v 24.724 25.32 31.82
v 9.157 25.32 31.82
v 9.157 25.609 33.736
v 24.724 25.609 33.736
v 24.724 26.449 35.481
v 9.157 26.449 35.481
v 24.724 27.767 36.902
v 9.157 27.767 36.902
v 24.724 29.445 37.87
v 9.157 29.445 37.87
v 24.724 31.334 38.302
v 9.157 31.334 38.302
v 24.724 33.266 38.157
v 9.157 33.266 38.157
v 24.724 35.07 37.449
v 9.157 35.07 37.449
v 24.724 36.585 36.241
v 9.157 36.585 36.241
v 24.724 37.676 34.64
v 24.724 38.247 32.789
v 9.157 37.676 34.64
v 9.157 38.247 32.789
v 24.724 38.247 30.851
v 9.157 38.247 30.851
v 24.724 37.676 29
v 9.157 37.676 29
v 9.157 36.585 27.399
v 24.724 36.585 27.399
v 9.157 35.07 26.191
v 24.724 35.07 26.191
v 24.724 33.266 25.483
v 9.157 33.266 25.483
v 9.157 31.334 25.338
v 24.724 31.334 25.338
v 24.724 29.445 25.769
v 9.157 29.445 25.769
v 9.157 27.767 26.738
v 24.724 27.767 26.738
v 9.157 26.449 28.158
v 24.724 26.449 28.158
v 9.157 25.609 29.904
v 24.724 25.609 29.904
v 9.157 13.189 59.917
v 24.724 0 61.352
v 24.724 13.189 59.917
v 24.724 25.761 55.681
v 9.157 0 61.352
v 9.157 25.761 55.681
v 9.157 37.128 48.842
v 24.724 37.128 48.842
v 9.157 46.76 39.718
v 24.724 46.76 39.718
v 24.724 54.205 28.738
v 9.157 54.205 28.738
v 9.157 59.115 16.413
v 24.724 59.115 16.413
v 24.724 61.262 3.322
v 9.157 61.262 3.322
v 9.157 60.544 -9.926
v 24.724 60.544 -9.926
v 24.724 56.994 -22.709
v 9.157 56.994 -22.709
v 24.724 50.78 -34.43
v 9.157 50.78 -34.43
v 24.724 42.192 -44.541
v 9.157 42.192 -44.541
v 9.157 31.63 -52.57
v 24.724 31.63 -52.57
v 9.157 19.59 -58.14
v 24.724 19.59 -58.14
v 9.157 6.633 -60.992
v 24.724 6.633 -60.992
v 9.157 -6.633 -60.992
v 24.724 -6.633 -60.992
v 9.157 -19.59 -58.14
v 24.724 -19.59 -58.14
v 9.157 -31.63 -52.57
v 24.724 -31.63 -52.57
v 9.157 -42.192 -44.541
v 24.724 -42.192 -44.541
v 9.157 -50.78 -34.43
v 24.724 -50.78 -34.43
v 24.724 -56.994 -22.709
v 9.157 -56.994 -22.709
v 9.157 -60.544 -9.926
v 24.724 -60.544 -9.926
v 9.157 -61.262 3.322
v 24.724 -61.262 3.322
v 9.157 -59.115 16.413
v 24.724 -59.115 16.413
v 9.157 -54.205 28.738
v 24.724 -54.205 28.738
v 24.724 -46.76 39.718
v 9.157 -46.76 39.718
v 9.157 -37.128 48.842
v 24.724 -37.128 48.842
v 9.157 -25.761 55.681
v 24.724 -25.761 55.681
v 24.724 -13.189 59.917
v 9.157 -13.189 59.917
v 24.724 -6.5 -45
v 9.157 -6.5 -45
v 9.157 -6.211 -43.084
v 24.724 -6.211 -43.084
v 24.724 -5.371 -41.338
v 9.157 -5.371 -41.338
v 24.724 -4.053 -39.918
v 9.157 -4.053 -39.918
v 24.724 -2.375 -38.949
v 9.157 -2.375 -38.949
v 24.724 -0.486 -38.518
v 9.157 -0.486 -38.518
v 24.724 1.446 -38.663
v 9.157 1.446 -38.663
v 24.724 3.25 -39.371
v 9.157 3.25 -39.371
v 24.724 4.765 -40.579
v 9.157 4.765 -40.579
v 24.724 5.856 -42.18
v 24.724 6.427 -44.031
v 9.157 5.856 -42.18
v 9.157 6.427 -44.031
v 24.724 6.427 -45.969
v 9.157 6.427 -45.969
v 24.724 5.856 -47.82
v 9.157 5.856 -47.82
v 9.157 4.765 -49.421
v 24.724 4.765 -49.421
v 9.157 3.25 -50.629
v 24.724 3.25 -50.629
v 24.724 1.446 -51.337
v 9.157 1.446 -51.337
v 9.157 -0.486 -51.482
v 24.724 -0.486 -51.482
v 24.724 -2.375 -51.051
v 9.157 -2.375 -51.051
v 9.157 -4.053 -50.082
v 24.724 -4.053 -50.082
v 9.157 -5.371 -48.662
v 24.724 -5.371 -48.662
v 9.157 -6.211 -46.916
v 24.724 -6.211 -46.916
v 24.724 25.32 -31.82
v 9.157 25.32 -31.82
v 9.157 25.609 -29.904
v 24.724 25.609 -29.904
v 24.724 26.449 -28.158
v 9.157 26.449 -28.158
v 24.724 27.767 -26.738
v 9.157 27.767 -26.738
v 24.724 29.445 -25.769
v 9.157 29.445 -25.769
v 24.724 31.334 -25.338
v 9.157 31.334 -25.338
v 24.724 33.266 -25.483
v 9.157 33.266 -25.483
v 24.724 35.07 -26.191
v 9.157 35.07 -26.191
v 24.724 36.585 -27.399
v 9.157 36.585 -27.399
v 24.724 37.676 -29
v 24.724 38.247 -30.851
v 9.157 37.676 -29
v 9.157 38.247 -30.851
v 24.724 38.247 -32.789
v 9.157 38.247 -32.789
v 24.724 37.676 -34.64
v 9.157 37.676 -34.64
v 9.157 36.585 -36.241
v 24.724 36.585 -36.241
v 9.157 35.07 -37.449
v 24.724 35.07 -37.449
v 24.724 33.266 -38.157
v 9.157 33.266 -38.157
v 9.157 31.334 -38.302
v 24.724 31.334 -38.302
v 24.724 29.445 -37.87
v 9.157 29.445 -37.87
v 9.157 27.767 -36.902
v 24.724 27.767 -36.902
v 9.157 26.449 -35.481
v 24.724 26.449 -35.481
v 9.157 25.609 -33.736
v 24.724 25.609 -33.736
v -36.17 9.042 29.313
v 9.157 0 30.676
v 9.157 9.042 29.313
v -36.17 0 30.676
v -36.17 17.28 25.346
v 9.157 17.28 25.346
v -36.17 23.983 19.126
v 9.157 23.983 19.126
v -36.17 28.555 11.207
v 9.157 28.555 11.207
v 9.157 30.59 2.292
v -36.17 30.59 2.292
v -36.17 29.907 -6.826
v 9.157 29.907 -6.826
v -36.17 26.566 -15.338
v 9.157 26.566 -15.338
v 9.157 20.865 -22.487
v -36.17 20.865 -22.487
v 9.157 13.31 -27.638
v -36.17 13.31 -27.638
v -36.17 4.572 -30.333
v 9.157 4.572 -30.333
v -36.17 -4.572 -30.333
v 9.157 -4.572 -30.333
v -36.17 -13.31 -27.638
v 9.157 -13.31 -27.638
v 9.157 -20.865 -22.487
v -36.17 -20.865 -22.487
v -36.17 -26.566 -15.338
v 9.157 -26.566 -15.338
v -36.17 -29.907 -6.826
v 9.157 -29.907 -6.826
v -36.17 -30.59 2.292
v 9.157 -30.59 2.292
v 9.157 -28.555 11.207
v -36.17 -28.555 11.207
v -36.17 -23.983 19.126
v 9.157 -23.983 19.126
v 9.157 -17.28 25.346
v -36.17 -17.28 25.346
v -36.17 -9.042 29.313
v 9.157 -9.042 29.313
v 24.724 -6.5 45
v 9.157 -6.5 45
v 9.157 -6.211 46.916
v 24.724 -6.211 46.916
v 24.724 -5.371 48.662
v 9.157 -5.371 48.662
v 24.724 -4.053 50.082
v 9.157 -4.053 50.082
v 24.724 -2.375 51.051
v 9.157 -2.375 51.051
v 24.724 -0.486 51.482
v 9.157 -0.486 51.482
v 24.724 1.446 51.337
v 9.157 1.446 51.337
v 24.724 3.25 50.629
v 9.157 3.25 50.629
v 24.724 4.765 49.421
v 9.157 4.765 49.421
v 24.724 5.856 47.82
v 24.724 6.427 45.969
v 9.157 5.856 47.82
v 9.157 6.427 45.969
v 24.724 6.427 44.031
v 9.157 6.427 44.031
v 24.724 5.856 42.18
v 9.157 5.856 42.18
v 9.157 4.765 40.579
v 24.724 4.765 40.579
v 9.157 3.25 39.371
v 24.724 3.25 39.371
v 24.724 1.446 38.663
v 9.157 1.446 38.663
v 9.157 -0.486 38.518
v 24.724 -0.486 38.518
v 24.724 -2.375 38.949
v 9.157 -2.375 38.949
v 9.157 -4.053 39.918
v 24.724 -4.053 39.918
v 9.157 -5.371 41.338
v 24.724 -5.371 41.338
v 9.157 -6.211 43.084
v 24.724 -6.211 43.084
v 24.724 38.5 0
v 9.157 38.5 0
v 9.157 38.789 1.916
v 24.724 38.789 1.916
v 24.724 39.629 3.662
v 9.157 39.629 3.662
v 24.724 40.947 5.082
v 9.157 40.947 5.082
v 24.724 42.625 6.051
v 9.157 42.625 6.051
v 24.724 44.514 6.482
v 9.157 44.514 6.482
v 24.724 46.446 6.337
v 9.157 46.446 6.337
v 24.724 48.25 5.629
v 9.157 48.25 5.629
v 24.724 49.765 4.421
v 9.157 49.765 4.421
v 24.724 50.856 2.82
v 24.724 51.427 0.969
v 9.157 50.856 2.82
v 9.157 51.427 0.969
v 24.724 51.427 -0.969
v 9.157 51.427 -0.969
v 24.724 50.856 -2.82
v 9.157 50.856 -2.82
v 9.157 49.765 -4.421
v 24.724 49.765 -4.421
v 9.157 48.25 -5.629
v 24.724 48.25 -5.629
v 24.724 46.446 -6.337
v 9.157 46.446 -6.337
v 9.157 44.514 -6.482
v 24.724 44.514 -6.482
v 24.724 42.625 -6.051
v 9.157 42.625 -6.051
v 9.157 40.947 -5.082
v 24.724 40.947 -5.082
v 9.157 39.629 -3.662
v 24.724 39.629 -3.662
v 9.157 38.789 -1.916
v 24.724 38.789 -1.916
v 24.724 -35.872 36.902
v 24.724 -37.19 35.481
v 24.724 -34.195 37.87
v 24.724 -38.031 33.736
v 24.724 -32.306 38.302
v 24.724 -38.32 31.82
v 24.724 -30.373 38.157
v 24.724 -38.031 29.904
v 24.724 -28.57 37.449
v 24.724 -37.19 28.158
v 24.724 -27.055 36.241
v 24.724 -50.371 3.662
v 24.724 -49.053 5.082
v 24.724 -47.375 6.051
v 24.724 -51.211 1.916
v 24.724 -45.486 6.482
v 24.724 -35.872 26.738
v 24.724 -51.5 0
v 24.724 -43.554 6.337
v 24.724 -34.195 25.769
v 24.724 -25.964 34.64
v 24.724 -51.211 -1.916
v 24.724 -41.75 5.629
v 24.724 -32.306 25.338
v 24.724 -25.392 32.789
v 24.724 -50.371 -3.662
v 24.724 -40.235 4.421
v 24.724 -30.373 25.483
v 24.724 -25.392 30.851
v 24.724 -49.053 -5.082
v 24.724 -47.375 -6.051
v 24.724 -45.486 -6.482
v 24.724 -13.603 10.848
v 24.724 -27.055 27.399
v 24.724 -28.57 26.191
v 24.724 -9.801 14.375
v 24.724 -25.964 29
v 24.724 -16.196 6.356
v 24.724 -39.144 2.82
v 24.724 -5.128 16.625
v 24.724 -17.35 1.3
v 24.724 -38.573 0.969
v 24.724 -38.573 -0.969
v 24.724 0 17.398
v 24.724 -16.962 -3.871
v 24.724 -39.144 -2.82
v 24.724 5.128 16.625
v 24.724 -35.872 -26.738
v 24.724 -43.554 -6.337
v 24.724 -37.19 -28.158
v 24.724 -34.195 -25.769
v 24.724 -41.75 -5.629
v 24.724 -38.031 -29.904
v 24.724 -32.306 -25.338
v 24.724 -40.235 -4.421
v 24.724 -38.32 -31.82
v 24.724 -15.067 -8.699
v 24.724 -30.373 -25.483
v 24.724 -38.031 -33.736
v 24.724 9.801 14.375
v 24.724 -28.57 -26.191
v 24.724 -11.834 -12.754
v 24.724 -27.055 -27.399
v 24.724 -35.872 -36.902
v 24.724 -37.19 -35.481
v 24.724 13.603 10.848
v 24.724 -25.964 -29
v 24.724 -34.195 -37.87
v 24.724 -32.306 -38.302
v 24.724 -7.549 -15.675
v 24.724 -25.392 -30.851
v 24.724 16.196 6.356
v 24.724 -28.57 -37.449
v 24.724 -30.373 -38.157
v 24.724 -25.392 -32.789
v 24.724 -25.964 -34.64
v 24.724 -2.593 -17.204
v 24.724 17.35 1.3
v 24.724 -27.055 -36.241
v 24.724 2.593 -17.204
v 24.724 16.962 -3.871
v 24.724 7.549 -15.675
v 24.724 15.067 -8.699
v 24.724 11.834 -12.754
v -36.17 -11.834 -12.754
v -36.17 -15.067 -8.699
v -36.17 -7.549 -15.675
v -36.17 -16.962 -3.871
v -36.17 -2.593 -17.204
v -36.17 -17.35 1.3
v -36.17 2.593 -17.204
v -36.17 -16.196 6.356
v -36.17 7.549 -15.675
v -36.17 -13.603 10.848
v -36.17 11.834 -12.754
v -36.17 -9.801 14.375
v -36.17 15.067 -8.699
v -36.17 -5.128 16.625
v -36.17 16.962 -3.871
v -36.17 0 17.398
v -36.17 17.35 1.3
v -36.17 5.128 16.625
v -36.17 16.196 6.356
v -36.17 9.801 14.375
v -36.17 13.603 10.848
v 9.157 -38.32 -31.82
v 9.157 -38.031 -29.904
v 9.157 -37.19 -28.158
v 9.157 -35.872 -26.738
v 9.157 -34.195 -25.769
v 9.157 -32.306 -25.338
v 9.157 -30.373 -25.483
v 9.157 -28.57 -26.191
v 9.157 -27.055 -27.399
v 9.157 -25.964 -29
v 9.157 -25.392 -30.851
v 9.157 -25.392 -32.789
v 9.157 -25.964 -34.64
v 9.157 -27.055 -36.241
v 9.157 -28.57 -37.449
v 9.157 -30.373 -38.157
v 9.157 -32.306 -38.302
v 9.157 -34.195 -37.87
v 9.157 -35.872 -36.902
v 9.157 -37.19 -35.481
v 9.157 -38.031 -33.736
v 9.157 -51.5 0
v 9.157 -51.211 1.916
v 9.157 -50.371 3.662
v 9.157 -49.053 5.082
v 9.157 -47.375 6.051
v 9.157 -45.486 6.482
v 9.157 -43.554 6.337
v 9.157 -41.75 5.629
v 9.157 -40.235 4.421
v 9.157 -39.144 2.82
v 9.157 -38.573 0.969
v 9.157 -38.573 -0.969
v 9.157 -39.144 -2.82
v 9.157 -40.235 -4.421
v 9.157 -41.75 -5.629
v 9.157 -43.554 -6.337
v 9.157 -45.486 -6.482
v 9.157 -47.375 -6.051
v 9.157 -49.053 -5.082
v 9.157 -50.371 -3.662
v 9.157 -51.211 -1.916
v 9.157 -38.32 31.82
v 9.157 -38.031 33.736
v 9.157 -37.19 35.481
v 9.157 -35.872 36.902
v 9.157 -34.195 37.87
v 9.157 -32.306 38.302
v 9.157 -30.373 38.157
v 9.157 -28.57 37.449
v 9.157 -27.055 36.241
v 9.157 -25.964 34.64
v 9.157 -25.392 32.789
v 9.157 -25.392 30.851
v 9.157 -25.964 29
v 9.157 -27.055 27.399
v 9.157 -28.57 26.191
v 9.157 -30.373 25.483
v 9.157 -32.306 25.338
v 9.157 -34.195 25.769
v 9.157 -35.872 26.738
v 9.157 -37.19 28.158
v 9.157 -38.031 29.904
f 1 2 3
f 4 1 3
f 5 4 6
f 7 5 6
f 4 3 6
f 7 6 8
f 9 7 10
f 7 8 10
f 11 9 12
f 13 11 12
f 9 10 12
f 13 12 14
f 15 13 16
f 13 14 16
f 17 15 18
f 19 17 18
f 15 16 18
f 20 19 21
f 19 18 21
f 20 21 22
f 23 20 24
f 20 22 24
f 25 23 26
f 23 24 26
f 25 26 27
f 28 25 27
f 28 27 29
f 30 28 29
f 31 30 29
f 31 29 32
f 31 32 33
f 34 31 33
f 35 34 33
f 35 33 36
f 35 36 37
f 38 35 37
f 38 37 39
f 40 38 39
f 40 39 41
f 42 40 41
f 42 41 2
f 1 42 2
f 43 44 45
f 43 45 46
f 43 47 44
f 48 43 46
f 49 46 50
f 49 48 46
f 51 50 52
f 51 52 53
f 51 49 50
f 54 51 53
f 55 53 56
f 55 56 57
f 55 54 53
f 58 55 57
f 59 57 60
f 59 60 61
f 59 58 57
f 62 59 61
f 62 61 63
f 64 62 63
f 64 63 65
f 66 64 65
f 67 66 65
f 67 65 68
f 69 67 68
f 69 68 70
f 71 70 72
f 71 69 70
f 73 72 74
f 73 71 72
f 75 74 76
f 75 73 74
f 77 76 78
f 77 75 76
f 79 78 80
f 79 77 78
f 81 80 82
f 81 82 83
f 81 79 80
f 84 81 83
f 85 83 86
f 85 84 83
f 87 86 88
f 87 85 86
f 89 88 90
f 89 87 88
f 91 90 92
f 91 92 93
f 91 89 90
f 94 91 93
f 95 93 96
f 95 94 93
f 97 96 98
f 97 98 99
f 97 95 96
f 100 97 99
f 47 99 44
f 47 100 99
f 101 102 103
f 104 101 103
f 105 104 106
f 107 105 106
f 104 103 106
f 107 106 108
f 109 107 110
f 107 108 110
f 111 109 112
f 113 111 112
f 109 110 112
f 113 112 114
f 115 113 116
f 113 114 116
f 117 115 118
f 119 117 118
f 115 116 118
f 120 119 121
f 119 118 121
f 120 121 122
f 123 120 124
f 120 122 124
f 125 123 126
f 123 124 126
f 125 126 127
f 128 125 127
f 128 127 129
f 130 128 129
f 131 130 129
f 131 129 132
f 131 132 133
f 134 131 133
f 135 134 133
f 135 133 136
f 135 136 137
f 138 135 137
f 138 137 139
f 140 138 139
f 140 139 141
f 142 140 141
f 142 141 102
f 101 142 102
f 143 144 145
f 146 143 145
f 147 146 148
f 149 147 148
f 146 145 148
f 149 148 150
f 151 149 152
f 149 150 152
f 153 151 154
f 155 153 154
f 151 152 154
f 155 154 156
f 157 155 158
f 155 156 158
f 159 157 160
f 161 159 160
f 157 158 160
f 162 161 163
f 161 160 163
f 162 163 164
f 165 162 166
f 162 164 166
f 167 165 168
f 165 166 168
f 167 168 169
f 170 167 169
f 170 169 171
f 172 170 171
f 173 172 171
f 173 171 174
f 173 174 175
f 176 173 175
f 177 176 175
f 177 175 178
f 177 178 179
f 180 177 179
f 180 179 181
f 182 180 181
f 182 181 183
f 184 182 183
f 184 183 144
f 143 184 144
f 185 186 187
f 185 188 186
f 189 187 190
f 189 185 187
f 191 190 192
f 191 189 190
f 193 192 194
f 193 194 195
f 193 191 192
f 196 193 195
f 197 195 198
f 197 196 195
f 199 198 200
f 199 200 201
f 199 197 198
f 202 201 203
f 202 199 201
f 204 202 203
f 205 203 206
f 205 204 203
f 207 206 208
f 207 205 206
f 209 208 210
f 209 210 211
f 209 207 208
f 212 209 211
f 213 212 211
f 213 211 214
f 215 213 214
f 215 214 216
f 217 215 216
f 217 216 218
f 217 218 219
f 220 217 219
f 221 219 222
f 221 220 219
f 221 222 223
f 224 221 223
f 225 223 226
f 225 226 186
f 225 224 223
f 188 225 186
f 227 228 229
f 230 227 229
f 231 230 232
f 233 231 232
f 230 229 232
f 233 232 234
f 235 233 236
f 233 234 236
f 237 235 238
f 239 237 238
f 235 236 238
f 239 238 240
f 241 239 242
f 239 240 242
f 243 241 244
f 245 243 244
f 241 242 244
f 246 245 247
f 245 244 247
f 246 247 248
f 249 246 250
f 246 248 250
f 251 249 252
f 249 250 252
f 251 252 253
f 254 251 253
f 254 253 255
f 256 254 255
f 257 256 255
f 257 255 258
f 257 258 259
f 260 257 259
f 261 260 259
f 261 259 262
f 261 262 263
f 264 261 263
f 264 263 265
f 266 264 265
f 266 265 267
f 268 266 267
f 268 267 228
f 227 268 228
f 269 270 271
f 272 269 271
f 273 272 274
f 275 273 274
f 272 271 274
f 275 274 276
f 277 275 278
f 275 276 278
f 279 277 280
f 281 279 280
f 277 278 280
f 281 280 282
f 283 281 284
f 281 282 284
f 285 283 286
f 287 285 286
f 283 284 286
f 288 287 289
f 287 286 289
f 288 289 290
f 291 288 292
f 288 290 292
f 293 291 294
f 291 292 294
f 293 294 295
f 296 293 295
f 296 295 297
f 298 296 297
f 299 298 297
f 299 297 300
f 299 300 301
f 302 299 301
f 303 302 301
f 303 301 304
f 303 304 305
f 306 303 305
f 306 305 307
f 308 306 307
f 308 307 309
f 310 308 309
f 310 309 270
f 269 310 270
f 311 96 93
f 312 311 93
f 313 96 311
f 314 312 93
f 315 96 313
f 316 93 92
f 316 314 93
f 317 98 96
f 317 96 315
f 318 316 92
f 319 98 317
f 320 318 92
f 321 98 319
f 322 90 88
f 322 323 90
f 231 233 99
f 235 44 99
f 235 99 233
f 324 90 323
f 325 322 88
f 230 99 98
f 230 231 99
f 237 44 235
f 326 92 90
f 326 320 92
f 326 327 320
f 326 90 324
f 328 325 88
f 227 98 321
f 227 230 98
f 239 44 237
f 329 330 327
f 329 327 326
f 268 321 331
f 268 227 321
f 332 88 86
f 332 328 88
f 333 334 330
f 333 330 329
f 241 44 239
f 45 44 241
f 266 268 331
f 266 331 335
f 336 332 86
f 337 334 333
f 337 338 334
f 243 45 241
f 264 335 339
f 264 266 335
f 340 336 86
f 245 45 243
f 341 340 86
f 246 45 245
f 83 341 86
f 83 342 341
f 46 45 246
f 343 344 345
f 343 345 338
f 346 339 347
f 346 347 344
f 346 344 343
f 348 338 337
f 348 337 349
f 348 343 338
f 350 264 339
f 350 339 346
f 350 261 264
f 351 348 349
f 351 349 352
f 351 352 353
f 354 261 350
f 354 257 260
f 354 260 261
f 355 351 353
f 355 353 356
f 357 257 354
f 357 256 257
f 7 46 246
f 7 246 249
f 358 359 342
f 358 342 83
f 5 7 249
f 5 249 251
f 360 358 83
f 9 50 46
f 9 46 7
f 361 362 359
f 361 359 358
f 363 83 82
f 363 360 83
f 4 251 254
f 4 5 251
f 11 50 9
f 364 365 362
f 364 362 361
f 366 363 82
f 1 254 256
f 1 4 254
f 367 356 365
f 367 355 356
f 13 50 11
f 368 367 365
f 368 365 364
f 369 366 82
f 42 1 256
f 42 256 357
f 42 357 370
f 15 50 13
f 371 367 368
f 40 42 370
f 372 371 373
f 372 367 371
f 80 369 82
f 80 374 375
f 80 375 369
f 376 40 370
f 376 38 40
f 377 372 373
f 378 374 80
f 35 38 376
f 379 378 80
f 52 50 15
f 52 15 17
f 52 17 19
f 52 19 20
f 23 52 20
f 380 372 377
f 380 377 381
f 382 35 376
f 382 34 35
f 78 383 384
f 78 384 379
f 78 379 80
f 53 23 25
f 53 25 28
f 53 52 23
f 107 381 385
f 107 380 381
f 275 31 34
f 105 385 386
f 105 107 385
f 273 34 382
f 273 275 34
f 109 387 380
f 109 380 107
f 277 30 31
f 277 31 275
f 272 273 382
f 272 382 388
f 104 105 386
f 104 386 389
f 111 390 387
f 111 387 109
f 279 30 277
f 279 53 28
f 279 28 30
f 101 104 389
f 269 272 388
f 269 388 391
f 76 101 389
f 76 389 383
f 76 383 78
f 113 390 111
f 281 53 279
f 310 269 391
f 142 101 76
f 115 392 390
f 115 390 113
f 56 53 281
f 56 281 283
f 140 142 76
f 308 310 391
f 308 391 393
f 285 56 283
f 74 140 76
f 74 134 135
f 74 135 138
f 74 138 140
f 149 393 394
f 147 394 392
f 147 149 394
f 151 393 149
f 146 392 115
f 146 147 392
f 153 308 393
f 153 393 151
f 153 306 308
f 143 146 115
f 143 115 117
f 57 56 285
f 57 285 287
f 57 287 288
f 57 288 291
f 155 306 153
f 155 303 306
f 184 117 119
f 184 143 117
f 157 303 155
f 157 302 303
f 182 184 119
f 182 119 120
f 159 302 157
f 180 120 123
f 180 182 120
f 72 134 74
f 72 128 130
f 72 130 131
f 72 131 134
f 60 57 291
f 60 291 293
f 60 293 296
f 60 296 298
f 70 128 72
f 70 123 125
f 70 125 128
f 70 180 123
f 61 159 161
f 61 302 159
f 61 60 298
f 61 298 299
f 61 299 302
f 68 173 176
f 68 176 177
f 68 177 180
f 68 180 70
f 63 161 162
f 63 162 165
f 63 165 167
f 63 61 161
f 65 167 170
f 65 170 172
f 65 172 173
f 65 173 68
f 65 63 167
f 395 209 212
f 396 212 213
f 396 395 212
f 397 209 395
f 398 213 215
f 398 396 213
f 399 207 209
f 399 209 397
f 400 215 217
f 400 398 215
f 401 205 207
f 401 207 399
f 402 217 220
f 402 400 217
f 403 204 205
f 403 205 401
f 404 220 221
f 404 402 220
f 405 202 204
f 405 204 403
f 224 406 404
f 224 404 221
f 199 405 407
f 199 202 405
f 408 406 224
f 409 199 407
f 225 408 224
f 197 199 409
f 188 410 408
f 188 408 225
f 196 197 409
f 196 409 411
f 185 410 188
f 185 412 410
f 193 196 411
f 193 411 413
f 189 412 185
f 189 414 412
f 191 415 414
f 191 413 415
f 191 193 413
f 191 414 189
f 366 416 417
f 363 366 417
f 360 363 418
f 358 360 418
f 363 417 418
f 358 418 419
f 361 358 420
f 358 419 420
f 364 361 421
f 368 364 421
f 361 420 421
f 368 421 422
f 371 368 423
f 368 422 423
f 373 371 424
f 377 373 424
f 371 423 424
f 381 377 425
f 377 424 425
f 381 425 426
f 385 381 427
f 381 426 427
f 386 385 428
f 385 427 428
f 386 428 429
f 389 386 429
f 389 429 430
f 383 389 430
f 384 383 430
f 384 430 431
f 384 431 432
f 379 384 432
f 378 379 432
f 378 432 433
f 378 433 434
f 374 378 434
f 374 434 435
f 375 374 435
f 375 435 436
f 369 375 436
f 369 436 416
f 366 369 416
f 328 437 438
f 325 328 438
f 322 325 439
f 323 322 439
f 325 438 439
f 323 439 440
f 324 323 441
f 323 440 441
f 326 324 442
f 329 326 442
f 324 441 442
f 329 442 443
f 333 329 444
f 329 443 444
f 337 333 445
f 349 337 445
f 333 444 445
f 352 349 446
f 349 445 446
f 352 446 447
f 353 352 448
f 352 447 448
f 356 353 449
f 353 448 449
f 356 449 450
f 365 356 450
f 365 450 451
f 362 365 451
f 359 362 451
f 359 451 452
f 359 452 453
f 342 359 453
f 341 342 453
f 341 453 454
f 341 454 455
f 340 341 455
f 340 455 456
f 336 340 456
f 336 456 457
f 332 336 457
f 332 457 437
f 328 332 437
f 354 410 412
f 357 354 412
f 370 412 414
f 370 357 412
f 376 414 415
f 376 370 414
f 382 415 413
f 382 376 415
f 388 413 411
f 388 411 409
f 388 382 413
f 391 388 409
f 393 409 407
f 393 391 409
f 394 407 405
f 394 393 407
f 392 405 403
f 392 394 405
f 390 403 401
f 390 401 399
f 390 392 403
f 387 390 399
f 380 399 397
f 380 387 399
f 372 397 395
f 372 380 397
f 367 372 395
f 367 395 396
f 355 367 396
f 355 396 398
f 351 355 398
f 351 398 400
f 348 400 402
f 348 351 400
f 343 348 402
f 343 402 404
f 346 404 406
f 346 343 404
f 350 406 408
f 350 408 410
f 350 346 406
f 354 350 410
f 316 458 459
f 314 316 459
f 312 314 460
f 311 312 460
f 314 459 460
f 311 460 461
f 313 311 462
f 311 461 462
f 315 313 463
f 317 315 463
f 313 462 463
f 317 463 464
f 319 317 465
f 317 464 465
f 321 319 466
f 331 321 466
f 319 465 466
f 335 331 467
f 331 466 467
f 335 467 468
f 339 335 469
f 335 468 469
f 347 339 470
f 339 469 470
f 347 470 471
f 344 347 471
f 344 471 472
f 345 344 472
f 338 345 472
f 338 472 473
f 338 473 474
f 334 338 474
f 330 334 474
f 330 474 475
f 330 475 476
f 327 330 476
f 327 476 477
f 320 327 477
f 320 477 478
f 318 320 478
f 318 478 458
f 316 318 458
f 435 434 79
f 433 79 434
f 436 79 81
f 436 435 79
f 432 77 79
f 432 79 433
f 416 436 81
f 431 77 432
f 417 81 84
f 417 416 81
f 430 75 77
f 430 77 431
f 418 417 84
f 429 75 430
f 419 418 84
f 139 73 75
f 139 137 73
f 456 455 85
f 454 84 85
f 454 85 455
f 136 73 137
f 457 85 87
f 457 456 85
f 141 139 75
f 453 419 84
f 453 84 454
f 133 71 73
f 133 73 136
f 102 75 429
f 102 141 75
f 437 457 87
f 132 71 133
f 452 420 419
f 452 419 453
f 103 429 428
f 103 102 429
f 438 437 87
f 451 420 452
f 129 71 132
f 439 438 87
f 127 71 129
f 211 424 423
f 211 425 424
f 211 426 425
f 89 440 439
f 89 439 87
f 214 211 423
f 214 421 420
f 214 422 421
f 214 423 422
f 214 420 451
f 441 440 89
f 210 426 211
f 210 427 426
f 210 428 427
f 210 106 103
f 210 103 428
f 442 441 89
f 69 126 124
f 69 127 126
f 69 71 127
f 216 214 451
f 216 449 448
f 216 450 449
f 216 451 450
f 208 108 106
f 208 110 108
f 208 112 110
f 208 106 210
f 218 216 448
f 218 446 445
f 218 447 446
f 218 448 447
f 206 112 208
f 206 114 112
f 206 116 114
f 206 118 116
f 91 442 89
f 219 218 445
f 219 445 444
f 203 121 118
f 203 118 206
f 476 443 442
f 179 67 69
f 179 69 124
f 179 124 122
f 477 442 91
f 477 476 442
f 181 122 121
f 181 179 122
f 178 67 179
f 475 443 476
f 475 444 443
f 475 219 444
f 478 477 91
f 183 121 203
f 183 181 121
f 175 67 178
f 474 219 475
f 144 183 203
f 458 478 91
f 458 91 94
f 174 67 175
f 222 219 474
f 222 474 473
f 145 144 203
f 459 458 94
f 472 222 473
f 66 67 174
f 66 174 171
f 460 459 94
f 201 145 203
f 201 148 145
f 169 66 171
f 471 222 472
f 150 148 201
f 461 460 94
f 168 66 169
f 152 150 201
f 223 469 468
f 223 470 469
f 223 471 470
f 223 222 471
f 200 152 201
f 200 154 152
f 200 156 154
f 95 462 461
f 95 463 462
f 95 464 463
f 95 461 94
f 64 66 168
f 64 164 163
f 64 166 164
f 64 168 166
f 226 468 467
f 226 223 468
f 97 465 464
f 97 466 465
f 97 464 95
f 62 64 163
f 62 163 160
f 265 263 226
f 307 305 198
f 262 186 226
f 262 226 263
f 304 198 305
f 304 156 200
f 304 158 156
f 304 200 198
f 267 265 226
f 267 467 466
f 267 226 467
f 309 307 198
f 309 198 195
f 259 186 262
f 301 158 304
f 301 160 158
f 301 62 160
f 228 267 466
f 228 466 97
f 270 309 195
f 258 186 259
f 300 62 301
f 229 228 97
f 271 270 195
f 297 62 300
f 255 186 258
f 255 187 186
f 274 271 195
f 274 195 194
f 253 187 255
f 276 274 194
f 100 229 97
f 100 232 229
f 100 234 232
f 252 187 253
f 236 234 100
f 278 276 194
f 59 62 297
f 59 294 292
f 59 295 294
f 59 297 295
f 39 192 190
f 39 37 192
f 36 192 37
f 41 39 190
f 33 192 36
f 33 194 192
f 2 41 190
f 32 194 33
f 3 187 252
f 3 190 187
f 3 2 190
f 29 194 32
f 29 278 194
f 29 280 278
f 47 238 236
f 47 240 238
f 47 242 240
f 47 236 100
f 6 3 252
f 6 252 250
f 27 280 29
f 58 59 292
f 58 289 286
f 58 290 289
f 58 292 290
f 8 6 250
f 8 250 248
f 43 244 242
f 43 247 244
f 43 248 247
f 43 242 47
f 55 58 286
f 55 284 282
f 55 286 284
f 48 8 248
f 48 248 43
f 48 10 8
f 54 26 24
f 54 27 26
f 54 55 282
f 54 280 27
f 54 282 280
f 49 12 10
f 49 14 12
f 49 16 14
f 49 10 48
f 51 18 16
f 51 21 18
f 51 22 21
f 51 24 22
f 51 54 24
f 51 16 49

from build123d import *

# Parameters (mm, degrees)
F2_R     = 6.5
F3_DEPTH = 15.567862


with BuildPart() as f1:
    # F0 (on Front) → F1 (revolve)
    with BuildSketch(Plane.XZ):
        Polygon((-36.170062, 17.398257), (24.723839, 17.398257), (24.723839, 61.351746), (9.156977, 61.351746), (9.156977, 30.675873), (-36.170062, 30.675873), align=None)
    revolve(axis=Axis((-16.482558, 0, 0), (-1, 0, 0)))

    # F2 (on face) → F3 (cut, through all)
    with BuildSketch(Plane(origin=(9.156977, 0, 0), x_dir=(0, -1, 0), z_dir=(-1, 0, 0))):
        with Locations((0, 45)):
            Circle(F2_R)
        with Locations((-31.819805, 31.819805)):
            Circle(F2_R)
        with Locations((-45, 0)):
            Circle(F2_R)
        with Locations((-31.819805, -31.819805)):
            Circle(F2_R)
        with Locations((0, -45)):
            Circle(F2_R)
        with Locations((31.819805, -31.819805)):
            Circle(F2_R)
        with Locations((45, 0)):
            Circle(F2_R)
        with Locations((31.819805, 31.819805)):
            Circle(F2_R)
    extrude(amount=-F3_DEPTH, mode=Mode.SUBTRACT)


solid = f1.part
